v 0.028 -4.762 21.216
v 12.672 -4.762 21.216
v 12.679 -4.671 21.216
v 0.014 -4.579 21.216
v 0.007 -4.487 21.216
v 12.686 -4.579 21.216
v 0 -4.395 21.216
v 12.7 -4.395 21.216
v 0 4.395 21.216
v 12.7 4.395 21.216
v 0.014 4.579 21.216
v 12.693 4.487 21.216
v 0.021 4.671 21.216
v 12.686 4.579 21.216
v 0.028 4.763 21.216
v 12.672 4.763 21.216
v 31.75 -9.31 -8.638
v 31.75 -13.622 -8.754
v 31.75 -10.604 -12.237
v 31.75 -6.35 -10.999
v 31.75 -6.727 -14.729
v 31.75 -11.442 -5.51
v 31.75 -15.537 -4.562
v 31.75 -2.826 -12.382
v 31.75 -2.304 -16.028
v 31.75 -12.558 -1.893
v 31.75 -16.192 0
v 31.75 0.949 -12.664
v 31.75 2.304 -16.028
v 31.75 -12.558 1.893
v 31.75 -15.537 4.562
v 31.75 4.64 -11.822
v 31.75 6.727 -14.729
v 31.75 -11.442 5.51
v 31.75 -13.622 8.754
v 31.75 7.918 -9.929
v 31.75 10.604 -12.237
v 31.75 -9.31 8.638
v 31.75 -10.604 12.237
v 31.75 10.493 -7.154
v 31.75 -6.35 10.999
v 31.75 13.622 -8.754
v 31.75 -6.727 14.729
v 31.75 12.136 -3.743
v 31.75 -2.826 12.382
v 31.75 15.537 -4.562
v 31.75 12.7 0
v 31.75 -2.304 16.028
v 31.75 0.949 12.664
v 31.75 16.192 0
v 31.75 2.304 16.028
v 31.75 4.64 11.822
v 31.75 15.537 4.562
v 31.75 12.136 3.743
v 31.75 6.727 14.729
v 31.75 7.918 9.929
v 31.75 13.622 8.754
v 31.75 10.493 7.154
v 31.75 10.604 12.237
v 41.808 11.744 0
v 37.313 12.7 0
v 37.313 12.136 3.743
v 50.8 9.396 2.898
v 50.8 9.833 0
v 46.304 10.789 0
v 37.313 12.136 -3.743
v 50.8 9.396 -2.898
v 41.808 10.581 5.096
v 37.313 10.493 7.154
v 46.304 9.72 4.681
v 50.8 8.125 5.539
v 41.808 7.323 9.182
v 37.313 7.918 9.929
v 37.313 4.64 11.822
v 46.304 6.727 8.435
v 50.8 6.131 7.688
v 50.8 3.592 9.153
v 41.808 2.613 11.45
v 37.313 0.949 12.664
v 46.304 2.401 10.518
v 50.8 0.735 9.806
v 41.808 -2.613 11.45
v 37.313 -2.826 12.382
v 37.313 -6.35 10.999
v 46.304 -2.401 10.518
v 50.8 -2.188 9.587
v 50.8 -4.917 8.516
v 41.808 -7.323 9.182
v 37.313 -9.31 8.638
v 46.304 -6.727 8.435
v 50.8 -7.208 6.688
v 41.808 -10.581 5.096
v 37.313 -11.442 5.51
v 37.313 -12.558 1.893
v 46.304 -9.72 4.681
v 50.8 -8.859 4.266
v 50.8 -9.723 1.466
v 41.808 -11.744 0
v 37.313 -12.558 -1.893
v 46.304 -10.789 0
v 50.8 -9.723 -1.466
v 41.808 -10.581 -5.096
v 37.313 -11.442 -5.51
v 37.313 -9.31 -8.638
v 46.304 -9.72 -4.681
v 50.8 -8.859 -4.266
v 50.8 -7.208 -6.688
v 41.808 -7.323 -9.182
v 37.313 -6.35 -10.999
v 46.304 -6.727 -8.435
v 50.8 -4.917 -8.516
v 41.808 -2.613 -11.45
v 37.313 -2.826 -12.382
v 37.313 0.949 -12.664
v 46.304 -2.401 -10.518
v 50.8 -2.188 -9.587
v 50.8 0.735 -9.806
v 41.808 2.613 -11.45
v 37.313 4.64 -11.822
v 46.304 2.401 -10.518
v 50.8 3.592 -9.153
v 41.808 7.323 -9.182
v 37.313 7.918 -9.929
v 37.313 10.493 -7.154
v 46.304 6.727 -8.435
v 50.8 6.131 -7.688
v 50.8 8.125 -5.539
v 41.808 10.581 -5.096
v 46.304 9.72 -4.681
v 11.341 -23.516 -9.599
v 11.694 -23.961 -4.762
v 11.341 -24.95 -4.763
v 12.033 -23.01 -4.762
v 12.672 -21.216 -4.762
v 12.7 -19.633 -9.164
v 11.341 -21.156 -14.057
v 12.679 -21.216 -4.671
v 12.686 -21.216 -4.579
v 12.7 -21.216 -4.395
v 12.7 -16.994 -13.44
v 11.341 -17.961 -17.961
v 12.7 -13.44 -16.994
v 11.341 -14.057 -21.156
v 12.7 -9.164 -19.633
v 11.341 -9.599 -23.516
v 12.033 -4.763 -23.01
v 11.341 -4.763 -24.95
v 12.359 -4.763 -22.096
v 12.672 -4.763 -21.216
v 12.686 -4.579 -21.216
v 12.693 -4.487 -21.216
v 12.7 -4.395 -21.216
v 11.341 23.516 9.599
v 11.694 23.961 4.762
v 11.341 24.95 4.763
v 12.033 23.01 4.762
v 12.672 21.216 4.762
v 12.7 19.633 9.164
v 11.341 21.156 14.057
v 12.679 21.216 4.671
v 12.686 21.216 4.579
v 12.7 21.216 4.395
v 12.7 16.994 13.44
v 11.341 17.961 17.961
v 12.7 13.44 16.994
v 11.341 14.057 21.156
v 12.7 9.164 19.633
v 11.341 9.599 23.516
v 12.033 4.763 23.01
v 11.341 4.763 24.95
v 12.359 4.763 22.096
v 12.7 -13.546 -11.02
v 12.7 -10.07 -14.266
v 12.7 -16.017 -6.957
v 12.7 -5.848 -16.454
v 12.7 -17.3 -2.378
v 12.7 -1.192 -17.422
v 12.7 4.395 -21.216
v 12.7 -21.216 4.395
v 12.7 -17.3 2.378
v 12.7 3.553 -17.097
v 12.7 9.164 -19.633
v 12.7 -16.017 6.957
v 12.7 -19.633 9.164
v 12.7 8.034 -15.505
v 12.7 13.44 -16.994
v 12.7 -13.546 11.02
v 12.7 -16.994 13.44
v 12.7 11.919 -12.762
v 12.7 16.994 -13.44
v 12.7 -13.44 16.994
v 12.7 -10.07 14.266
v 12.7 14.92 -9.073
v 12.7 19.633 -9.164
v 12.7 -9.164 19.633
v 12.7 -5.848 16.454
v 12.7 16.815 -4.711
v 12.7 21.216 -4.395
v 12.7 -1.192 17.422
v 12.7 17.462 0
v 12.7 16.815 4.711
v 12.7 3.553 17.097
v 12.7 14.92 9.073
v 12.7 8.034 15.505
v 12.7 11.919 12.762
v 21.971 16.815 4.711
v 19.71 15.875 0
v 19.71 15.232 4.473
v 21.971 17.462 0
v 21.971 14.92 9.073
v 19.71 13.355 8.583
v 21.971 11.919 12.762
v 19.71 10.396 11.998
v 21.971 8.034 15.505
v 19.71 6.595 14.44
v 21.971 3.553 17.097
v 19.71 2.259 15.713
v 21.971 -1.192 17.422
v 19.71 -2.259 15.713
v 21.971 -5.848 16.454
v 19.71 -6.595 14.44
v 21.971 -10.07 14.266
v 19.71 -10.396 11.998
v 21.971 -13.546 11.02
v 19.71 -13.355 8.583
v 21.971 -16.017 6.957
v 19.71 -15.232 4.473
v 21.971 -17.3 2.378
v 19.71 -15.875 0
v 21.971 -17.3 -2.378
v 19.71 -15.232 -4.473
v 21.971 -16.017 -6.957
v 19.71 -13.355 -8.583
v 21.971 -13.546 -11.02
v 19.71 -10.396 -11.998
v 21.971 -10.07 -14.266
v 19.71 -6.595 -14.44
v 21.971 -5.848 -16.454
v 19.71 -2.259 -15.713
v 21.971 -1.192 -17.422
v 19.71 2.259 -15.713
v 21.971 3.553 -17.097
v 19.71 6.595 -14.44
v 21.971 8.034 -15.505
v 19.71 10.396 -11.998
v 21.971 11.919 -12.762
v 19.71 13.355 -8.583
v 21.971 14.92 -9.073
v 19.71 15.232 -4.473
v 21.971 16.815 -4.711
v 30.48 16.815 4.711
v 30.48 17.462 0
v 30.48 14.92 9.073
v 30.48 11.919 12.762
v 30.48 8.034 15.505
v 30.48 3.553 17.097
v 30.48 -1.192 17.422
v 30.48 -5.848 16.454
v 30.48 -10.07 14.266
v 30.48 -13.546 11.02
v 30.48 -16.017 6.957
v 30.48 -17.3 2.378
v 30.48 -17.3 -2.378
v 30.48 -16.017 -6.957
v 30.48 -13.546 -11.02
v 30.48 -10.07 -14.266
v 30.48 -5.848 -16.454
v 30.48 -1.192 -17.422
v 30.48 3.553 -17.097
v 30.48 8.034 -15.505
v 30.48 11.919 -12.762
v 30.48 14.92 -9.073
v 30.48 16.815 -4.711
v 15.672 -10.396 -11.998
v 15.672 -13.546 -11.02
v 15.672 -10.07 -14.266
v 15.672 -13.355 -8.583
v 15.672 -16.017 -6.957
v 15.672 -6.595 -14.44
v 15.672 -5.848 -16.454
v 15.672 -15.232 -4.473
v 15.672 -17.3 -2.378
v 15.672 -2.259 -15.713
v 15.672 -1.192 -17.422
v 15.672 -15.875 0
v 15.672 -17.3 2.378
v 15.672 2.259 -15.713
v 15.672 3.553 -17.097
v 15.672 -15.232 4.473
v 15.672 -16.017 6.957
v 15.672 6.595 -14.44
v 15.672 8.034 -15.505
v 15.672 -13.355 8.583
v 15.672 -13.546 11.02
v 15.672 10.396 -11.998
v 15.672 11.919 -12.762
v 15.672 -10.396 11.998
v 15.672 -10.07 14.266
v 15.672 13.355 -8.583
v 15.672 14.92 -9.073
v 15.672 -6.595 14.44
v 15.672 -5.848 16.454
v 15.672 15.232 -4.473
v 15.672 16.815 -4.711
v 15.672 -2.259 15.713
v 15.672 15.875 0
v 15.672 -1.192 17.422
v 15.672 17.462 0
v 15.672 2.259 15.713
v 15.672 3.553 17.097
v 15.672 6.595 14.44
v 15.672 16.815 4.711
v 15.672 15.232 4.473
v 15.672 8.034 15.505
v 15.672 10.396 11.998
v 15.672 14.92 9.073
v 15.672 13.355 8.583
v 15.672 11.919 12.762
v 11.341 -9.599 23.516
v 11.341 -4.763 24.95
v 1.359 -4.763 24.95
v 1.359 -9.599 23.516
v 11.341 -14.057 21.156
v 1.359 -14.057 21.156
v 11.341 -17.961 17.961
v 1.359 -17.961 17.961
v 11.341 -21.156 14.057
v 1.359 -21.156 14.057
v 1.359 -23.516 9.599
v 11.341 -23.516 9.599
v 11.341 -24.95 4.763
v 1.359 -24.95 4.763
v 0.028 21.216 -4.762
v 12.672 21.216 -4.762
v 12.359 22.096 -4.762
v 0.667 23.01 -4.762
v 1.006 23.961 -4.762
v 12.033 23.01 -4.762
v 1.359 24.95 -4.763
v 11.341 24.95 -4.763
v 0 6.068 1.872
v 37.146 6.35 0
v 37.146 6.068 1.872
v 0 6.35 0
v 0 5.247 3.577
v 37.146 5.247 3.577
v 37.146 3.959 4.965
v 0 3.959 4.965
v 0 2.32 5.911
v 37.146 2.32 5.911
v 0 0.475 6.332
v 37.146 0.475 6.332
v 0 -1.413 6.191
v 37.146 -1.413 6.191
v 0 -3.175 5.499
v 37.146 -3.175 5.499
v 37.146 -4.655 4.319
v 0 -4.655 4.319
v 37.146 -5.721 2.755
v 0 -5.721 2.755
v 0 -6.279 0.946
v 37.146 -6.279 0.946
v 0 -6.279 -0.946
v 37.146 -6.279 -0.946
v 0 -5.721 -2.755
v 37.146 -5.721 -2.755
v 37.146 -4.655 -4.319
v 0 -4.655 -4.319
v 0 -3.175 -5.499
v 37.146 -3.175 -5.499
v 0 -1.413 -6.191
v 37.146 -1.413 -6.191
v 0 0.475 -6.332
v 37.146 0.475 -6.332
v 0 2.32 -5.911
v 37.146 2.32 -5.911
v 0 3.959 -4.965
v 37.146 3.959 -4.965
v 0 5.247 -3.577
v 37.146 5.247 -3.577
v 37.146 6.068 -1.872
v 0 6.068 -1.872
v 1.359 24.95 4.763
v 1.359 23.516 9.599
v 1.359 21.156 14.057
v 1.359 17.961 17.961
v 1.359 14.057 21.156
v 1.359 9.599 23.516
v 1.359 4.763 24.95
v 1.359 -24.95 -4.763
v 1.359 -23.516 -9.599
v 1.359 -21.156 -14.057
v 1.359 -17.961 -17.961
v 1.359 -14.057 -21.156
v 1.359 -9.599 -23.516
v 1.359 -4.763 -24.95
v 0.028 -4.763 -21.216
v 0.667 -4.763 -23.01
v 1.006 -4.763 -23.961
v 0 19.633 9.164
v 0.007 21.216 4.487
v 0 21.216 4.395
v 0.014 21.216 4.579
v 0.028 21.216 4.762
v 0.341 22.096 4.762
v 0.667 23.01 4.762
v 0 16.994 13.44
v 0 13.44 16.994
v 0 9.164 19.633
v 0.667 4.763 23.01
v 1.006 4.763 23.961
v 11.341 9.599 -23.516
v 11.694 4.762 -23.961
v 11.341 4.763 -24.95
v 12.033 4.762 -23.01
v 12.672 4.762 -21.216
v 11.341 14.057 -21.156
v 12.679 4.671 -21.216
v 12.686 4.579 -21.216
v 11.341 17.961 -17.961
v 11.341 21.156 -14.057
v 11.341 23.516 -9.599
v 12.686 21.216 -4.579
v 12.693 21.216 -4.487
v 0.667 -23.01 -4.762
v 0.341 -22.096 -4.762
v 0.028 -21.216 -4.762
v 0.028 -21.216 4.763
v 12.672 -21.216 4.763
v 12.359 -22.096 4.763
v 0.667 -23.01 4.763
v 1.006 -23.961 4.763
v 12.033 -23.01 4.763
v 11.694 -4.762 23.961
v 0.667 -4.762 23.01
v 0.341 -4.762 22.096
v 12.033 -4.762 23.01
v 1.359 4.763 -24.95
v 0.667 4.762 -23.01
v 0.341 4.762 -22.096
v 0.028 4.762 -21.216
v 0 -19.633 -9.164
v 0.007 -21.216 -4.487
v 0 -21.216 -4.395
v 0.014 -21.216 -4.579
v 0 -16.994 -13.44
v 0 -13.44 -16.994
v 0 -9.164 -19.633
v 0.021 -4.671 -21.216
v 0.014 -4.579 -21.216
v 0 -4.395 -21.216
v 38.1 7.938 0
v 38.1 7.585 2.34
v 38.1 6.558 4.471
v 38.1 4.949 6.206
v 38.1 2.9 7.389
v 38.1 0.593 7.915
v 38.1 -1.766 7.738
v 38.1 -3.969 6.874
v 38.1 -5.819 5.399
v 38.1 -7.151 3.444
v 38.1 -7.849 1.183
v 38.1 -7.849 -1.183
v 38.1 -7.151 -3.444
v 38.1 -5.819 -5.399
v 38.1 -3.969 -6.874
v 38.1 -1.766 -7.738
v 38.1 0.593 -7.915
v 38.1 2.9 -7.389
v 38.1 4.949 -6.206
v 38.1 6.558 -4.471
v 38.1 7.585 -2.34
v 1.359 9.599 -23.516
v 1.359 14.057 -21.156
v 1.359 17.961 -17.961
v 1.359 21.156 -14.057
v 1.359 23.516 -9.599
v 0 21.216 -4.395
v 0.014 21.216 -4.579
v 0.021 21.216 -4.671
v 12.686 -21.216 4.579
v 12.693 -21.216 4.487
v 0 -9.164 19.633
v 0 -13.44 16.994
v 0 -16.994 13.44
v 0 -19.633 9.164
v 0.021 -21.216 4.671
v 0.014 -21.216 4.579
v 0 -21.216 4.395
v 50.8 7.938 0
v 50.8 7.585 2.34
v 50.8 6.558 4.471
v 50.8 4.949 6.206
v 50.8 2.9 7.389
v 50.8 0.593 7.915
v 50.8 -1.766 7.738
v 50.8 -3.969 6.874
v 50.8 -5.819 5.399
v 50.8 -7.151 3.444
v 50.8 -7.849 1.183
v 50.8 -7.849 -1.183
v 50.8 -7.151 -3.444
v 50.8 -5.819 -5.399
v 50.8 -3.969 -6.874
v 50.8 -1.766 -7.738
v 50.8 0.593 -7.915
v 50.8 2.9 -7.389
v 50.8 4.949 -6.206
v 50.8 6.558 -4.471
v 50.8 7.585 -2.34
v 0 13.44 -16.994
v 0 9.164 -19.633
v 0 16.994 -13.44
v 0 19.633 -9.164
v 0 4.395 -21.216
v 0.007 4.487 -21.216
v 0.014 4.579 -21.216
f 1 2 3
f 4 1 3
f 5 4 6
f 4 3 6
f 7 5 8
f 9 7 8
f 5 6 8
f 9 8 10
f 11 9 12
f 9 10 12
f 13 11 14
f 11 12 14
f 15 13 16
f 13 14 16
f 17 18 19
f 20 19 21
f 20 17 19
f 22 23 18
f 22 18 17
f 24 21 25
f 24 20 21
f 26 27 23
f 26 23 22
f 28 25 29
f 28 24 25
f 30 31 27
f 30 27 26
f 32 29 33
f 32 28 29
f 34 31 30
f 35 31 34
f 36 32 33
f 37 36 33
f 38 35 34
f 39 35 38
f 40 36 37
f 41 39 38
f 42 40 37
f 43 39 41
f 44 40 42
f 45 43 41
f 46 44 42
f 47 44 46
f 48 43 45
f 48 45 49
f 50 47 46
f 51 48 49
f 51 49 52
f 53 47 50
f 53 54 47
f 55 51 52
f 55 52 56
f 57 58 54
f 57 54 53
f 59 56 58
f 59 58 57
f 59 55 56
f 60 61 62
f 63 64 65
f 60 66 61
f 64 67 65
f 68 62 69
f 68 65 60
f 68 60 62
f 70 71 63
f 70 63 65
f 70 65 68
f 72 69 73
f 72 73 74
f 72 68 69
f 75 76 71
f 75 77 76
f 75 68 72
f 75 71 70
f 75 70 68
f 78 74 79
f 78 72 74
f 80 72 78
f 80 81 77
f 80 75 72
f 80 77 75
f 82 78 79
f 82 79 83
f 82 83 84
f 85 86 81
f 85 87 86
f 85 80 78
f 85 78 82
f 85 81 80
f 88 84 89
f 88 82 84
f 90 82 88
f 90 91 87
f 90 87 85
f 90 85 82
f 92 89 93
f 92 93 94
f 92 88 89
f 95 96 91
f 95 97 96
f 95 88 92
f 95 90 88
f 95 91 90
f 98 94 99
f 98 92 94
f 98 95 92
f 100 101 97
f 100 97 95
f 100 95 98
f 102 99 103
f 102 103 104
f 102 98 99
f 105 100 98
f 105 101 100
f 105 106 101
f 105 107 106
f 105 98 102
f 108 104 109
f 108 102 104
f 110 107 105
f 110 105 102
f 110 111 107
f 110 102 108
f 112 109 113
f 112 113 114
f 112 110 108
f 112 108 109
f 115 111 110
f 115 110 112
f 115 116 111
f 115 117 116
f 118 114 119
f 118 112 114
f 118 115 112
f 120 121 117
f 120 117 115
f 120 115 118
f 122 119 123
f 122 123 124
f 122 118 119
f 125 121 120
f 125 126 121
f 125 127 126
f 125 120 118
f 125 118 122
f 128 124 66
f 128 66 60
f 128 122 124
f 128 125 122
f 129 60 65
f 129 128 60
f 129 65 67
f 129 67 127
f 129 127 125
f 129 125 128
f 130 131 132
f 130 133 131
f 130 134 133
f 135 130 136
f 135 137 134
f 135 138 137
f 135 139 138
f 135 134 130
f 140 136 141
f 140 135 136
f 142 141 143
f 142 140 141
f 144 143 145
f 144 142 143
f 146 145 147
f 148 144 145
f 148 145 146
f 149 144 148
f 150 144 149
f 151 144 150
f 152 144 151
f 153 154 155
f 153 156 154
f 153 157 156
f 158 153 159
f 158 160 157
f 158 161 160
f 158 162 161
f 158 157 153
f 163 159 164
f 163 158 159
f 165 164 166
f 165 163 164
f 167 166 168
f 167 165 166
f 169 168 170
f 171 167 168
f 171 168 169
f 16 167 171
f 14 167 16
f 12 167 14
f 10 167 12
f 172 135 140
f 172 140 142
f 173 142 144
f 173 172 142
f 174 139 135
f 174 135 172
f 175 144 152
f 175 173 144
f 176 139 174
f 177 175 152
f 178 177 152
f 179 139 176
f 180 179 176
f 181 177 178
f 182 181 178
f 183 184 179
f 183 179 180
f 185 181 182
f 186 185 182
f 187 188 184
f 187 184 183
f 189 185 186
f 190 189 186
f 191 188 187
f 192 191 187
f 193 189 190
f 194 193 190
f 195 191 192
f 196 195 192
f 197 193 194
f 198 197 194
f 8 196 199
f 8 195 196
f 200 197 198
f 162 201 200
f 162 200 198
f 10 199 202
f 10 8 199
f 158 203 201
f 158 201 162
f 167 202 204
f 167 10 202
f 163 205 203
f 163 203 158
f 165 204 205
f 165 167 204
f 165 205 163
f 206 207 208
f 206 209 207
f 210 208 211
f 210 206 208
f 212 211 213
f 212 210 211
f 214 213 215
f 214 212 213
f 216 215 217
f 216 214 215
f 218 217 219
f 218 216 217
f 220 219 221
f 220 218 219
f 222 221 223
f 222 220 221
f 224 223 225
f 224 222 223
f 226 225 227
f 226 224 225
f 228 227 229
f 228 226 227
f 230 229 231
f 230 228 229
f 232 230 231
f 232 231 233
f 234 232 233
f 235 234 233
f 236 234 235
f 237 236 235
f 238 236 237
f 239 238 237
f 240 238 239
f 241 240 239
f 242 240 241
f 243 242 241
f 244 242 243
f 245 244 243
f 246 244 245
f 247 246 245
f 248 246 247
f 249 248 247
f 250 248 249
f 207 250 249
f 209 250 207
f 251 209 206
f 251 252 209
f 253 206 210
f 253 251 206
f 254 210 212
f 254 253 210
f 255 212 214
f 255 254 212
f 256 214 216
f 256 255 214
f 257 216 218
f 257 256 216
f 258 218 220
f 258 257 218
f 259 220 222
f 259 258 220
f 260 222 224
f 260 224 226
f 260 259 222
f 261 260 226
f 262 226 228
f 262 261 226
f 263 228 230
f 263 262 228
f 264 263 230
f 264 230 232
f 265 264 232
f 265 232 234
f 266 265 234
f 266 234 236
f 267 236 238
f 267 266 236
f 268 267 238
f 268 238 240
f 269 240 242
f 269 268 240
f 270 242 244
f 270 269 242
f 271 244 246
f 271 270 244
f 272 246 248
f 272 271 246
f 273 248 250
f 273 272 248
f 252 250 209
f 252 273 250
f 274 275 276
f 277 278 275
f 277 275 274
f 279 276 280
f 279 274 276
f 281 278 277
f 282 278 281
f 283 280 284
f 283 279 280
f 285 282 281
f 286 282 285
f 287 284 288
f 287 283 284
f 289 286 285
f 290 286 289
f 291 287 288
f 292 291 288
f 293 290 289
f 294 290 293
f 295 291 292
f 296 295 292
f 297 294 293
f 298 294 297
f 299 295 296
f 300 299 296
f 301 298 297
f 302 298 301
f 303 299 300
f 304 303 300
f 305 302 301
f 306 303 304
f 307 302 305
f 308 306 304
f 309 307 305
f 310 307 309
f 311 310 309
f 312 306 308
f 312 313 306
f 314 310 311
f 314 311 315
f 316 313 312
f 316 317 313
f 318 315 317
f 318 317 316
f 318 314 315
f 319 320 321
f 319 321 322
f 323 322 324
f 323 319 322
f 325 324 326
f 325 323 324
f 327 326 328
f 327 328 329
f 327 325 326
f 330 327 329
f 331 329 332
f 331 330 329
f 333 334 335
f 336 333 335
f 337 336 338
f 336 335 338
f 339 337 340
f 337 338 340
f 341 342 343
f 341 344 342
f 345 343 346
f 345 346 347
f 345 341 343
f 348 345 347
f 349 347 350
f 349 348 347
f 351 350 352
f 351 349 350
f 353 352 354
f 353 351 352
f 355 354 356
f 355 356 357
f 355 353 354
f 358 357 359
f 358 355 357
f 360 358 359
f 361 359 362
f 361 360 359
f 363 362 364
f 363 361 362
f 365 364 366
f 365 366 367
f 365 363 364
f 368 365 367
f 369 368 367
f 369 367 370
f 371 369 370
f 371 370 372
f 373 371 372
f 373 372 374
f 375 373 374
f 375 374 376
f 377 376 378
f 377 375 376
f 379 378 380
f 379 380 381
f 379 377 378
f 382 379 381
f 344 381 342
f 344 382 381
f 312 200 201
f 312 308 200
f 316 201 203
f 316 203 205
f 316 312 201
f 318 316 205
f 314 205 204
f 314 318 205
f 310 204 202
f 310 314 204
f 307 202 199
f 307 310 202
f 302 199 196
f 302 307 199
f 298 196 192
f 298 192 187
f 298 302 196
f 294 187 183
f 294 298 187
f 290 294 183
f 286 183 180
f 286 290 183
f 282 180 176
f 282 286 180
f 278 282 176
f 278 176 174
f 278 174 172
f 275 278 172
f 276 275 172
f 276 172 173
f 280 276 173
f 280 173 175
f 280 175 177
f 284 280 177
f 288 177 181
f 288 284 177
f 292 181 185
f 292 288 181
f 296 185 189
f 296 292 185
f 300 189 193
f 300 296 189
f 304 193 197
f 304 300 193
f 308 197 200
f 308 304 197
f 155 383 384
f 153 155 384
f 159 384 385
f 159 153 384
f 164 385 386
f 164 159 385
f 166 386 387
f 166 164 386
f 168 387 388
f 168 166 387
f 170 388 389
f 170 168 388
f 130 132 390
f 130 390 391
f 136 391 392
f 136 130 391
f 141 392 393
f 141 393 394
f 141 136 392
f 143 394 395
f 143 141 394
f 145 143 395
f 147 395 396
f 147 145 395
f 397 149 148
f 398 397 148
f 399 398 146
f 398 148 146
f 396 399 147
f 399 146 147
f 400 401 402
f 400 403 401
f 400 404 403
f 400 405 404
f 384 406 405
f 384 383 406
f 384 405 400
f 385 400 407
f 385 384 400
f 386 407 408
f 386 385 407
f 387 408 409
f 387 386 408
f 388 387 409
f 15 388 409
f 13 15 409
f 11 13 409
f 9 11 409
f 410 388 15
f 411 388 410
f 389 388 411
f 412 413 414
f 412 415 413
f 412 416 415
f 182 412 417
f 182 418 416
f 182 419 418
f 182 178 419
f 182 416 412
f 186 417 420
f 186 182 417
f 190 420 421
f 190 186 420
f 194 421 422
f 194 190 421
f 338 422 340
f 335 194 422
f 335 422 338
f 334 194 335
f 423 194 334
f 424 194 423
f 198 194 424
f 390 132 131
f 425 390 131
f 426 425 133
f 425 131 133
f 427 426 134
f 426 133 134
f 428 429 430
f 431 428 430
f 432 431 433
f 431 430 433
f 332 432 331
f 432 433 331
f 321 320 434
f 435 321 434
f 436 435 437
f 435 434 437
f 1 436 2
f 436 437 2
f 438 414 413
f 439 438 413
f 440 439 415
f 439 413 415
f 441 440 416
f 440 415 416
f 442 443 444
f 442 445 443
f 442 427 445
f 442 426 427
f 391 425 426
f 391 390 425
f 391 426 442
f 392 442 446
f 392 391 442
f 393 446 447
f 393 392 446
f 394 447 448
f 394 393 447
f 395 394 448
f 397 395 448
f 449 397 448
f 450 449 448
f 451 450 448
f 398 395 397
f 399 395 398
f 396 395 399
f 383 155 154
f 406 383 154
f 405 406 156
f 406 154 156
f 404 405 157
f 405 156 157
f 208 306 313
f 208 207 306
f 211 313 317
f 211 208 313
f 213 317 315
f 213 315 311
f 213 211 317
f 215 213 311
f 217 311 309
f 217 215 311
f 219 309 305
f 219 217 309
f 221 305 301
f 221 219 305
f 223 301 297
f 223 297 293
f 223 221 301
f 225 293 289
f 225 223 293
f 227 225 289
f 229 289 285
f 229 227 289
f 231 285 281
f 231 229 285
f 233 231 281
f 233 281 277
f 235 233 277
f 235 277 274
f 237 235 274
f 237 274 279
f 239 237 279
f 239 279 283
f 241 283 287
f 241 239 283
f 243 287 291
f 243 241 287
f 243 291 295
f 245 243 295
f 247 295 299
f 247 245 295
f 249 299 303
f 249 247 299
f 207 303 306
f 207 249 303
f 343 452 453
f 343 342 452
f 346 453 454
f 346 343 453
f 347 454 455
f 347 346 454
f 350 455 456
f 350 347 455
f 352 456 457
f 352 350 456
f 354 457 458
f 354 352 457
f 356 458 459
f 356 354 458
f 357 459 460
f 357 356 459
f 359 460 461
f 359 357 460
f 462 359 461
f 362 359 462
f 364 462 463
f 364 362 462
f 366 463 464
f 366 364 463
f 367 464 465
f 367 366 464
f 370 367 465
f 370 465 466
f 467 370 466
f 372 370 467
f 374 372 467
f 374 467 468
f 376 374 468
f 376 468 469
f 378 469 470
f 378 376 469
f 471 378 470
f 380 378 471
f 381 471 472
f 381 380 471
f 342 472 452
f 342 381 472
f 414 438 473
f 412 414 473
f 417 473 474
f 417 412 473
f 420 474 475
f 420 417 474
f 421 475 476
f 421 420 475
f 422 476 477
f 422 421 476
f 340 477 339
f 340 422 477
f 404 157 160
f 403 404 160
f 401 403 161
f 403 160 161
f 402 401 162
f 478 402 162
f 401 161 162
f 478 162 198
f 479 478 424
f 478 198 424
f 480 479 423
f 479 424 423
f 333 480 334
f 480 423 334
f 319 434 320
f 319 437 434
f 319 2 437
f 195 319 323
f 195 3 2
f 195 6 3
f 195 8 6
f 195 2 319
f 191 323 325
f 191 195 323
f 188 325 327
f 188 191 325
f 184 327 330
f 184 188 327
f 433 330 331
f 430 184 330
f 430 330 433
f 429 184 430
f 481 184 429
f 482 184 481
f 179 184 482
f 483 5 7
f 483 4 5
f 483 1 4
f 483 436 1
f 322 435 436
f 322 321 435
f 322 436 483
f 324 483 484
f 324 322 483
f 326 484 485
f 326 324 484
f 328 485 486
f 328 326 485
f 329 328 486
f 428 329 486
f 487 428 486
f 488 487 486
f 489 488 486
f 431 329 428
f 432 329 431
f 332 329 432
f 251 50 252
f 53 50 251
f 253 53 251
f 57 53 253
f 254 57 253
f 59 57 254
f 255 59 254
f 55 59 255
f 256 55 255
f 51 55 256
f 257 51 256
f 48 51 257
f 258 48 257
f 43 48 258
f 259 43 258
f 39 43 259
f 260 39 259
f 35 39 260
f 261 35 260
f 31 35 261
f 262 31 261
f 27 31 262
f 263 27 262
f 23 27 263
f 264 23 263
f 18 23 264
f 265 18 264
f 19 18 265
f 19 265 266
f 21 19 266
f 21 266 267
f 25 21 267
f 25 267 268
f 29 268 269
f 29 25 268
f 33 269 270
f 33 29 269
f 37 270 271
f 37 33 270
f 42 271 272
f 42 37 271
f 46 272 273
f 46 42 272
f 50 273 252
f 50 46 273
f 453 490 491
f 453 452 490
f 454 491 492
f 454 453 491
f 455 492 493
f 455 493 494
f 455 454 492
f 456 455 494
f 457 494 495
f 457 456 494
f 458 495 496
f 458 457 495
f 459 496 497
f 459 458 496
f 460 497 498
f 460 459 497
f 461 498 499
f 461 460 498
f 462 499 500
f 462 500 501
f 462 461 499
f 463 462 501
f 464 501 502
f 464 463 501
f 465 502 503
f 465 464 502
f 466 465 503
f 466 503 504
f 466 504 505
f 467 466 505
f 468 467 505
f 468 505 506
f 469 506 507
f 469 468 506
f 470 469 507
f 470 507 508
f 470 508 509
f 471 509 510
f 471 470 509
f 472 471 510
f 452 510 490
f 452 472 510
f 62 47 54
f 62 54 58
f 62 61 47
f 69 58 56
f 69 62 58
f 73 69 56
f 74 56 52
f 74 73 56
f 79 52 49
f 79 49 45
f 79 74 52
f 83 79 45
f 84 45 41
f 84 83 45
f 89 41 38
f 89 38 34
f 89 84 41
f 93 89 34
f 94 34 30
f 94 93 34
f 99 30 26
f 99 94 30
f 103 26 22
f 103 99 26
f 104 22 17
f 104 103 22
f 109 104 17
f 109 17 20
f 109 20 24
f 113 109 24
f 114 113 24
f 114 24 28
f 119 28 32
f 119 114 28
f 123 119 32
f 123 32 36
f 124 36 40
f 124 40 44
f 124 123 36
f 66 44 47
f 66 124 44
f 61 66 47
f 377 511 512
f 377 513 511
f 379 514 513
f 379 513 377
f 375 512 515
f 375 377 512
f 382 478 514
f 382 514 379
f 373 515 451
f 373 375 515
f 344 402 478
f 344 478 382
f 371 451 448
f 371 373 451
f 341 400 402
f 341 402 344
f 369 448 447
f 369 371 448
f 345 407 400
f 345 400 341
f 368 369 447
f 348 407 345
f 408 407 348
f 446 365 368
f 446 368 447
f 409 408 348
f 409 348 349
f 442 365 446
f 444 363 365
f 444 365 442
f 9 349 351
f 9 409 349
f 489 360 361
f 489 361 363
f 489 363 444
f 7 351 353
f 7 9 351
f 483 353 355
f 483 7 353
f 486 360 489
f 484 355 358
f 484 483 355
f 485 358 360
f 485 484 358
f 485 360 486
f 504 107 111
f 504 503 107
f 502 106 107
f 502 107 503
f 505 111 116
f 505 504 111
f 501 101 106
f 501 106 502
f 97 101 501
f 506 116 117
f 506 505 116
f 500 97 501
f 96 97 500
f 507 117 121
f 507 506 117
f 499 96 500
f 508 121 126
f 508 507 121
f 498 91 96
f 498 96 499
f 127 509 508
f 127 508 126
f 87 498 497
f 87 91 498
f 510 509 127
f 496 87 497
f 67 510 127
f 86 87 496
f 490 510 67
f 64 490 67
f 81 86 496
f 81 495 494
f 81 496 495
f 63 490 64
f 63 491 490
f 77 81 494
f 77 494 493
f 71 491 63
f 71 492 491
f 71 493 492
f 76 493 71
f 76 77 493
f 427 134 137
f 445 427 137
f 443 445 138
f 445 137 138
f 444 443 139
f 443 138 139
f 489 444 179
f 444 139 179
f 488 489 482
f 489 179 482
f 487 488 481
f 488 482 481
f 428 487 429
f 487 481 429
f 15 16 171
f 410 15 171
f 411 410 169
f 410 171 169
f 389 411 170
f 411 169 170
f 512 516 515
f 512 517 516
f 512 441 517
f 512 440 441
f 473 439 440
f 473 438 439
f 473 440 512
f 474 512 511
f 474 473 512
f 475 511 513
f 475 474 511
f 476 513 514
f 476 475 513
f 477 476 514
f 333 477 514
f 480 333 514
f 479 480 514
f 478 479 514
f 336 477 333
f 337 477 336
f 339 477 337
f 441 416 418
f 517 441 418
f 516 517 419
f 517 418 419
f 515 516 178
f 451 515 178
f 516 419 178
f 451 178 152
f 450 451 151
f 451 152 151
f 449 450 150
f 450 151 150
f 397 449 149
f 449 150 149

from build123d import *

# Parameters (mm, degrees)
CUT_EXTRUDE1_START = -12.700006
CUT_EXTRUDE1_DEPTH = 12.700012
CIRPATTERN1_COUNT  = 4


with BuildPart() as part:
    # Sketch1 → Revolve1 (revolve)
    with BuildSketch(Plane.XY):
        Polygon((0, 6.35), (0, 21.6662), (1.358992061, 25.4), (11.341007939, 25.4), (12.7, 21.6662), (12.7, 17.4625), (15.6718, 17.4625), (15.6718, 15.875), (19.7104, 15.875), (21.971, 17.4625), (30.48, 17.4625), (31.75, 16.1925), (31.75, 12.7), (37.3126, 12.7), (50.8, 9.83316463), (50.8, 7.9375), (38.1, 7.9375), (37.146133767, 6.35), align=None)
    revolve(axis=Axis((0, 0, 0), (1, 0, 0)))

    # Sketch2 → Cut-Extrude1 (cut)
    with BuildSketch(Plane.ZY.offset(CUT_EXTRUDE1_START)):
        with BuildLine():
            Line((-4.7625, 21.215720912), (-4.7625, 24.949520912))
            ThreePointArc((-4.7625, 24.949520912), (0, 25.4), (4.7625, 24.949520912))
            Line((4.7625, 24.949520912), (4.7625, 21.215720912))
            Line((4.7625, 21.215720912), (-4.7625, 21.215720912))
        make_face()
    cut_extrude1 = extrude(amount=CUT_EXTRUDE1_DEPTH, mode=Mode.SUBTRACT)

    # CirPattern1: Cut-Extrude1 ×4 about axis
    cirpattern1_axis = Axis((0, 0, 0), (1, 0, 0))
    for i in range(1, CIRPATTERN1_COUNT):
        add(cut_extrude1.rotate(cirpattern1_axis, i * 360 / CIRPATTERN1_COUNT), mode=Mode.SUBTRACT)


solid = part.part
